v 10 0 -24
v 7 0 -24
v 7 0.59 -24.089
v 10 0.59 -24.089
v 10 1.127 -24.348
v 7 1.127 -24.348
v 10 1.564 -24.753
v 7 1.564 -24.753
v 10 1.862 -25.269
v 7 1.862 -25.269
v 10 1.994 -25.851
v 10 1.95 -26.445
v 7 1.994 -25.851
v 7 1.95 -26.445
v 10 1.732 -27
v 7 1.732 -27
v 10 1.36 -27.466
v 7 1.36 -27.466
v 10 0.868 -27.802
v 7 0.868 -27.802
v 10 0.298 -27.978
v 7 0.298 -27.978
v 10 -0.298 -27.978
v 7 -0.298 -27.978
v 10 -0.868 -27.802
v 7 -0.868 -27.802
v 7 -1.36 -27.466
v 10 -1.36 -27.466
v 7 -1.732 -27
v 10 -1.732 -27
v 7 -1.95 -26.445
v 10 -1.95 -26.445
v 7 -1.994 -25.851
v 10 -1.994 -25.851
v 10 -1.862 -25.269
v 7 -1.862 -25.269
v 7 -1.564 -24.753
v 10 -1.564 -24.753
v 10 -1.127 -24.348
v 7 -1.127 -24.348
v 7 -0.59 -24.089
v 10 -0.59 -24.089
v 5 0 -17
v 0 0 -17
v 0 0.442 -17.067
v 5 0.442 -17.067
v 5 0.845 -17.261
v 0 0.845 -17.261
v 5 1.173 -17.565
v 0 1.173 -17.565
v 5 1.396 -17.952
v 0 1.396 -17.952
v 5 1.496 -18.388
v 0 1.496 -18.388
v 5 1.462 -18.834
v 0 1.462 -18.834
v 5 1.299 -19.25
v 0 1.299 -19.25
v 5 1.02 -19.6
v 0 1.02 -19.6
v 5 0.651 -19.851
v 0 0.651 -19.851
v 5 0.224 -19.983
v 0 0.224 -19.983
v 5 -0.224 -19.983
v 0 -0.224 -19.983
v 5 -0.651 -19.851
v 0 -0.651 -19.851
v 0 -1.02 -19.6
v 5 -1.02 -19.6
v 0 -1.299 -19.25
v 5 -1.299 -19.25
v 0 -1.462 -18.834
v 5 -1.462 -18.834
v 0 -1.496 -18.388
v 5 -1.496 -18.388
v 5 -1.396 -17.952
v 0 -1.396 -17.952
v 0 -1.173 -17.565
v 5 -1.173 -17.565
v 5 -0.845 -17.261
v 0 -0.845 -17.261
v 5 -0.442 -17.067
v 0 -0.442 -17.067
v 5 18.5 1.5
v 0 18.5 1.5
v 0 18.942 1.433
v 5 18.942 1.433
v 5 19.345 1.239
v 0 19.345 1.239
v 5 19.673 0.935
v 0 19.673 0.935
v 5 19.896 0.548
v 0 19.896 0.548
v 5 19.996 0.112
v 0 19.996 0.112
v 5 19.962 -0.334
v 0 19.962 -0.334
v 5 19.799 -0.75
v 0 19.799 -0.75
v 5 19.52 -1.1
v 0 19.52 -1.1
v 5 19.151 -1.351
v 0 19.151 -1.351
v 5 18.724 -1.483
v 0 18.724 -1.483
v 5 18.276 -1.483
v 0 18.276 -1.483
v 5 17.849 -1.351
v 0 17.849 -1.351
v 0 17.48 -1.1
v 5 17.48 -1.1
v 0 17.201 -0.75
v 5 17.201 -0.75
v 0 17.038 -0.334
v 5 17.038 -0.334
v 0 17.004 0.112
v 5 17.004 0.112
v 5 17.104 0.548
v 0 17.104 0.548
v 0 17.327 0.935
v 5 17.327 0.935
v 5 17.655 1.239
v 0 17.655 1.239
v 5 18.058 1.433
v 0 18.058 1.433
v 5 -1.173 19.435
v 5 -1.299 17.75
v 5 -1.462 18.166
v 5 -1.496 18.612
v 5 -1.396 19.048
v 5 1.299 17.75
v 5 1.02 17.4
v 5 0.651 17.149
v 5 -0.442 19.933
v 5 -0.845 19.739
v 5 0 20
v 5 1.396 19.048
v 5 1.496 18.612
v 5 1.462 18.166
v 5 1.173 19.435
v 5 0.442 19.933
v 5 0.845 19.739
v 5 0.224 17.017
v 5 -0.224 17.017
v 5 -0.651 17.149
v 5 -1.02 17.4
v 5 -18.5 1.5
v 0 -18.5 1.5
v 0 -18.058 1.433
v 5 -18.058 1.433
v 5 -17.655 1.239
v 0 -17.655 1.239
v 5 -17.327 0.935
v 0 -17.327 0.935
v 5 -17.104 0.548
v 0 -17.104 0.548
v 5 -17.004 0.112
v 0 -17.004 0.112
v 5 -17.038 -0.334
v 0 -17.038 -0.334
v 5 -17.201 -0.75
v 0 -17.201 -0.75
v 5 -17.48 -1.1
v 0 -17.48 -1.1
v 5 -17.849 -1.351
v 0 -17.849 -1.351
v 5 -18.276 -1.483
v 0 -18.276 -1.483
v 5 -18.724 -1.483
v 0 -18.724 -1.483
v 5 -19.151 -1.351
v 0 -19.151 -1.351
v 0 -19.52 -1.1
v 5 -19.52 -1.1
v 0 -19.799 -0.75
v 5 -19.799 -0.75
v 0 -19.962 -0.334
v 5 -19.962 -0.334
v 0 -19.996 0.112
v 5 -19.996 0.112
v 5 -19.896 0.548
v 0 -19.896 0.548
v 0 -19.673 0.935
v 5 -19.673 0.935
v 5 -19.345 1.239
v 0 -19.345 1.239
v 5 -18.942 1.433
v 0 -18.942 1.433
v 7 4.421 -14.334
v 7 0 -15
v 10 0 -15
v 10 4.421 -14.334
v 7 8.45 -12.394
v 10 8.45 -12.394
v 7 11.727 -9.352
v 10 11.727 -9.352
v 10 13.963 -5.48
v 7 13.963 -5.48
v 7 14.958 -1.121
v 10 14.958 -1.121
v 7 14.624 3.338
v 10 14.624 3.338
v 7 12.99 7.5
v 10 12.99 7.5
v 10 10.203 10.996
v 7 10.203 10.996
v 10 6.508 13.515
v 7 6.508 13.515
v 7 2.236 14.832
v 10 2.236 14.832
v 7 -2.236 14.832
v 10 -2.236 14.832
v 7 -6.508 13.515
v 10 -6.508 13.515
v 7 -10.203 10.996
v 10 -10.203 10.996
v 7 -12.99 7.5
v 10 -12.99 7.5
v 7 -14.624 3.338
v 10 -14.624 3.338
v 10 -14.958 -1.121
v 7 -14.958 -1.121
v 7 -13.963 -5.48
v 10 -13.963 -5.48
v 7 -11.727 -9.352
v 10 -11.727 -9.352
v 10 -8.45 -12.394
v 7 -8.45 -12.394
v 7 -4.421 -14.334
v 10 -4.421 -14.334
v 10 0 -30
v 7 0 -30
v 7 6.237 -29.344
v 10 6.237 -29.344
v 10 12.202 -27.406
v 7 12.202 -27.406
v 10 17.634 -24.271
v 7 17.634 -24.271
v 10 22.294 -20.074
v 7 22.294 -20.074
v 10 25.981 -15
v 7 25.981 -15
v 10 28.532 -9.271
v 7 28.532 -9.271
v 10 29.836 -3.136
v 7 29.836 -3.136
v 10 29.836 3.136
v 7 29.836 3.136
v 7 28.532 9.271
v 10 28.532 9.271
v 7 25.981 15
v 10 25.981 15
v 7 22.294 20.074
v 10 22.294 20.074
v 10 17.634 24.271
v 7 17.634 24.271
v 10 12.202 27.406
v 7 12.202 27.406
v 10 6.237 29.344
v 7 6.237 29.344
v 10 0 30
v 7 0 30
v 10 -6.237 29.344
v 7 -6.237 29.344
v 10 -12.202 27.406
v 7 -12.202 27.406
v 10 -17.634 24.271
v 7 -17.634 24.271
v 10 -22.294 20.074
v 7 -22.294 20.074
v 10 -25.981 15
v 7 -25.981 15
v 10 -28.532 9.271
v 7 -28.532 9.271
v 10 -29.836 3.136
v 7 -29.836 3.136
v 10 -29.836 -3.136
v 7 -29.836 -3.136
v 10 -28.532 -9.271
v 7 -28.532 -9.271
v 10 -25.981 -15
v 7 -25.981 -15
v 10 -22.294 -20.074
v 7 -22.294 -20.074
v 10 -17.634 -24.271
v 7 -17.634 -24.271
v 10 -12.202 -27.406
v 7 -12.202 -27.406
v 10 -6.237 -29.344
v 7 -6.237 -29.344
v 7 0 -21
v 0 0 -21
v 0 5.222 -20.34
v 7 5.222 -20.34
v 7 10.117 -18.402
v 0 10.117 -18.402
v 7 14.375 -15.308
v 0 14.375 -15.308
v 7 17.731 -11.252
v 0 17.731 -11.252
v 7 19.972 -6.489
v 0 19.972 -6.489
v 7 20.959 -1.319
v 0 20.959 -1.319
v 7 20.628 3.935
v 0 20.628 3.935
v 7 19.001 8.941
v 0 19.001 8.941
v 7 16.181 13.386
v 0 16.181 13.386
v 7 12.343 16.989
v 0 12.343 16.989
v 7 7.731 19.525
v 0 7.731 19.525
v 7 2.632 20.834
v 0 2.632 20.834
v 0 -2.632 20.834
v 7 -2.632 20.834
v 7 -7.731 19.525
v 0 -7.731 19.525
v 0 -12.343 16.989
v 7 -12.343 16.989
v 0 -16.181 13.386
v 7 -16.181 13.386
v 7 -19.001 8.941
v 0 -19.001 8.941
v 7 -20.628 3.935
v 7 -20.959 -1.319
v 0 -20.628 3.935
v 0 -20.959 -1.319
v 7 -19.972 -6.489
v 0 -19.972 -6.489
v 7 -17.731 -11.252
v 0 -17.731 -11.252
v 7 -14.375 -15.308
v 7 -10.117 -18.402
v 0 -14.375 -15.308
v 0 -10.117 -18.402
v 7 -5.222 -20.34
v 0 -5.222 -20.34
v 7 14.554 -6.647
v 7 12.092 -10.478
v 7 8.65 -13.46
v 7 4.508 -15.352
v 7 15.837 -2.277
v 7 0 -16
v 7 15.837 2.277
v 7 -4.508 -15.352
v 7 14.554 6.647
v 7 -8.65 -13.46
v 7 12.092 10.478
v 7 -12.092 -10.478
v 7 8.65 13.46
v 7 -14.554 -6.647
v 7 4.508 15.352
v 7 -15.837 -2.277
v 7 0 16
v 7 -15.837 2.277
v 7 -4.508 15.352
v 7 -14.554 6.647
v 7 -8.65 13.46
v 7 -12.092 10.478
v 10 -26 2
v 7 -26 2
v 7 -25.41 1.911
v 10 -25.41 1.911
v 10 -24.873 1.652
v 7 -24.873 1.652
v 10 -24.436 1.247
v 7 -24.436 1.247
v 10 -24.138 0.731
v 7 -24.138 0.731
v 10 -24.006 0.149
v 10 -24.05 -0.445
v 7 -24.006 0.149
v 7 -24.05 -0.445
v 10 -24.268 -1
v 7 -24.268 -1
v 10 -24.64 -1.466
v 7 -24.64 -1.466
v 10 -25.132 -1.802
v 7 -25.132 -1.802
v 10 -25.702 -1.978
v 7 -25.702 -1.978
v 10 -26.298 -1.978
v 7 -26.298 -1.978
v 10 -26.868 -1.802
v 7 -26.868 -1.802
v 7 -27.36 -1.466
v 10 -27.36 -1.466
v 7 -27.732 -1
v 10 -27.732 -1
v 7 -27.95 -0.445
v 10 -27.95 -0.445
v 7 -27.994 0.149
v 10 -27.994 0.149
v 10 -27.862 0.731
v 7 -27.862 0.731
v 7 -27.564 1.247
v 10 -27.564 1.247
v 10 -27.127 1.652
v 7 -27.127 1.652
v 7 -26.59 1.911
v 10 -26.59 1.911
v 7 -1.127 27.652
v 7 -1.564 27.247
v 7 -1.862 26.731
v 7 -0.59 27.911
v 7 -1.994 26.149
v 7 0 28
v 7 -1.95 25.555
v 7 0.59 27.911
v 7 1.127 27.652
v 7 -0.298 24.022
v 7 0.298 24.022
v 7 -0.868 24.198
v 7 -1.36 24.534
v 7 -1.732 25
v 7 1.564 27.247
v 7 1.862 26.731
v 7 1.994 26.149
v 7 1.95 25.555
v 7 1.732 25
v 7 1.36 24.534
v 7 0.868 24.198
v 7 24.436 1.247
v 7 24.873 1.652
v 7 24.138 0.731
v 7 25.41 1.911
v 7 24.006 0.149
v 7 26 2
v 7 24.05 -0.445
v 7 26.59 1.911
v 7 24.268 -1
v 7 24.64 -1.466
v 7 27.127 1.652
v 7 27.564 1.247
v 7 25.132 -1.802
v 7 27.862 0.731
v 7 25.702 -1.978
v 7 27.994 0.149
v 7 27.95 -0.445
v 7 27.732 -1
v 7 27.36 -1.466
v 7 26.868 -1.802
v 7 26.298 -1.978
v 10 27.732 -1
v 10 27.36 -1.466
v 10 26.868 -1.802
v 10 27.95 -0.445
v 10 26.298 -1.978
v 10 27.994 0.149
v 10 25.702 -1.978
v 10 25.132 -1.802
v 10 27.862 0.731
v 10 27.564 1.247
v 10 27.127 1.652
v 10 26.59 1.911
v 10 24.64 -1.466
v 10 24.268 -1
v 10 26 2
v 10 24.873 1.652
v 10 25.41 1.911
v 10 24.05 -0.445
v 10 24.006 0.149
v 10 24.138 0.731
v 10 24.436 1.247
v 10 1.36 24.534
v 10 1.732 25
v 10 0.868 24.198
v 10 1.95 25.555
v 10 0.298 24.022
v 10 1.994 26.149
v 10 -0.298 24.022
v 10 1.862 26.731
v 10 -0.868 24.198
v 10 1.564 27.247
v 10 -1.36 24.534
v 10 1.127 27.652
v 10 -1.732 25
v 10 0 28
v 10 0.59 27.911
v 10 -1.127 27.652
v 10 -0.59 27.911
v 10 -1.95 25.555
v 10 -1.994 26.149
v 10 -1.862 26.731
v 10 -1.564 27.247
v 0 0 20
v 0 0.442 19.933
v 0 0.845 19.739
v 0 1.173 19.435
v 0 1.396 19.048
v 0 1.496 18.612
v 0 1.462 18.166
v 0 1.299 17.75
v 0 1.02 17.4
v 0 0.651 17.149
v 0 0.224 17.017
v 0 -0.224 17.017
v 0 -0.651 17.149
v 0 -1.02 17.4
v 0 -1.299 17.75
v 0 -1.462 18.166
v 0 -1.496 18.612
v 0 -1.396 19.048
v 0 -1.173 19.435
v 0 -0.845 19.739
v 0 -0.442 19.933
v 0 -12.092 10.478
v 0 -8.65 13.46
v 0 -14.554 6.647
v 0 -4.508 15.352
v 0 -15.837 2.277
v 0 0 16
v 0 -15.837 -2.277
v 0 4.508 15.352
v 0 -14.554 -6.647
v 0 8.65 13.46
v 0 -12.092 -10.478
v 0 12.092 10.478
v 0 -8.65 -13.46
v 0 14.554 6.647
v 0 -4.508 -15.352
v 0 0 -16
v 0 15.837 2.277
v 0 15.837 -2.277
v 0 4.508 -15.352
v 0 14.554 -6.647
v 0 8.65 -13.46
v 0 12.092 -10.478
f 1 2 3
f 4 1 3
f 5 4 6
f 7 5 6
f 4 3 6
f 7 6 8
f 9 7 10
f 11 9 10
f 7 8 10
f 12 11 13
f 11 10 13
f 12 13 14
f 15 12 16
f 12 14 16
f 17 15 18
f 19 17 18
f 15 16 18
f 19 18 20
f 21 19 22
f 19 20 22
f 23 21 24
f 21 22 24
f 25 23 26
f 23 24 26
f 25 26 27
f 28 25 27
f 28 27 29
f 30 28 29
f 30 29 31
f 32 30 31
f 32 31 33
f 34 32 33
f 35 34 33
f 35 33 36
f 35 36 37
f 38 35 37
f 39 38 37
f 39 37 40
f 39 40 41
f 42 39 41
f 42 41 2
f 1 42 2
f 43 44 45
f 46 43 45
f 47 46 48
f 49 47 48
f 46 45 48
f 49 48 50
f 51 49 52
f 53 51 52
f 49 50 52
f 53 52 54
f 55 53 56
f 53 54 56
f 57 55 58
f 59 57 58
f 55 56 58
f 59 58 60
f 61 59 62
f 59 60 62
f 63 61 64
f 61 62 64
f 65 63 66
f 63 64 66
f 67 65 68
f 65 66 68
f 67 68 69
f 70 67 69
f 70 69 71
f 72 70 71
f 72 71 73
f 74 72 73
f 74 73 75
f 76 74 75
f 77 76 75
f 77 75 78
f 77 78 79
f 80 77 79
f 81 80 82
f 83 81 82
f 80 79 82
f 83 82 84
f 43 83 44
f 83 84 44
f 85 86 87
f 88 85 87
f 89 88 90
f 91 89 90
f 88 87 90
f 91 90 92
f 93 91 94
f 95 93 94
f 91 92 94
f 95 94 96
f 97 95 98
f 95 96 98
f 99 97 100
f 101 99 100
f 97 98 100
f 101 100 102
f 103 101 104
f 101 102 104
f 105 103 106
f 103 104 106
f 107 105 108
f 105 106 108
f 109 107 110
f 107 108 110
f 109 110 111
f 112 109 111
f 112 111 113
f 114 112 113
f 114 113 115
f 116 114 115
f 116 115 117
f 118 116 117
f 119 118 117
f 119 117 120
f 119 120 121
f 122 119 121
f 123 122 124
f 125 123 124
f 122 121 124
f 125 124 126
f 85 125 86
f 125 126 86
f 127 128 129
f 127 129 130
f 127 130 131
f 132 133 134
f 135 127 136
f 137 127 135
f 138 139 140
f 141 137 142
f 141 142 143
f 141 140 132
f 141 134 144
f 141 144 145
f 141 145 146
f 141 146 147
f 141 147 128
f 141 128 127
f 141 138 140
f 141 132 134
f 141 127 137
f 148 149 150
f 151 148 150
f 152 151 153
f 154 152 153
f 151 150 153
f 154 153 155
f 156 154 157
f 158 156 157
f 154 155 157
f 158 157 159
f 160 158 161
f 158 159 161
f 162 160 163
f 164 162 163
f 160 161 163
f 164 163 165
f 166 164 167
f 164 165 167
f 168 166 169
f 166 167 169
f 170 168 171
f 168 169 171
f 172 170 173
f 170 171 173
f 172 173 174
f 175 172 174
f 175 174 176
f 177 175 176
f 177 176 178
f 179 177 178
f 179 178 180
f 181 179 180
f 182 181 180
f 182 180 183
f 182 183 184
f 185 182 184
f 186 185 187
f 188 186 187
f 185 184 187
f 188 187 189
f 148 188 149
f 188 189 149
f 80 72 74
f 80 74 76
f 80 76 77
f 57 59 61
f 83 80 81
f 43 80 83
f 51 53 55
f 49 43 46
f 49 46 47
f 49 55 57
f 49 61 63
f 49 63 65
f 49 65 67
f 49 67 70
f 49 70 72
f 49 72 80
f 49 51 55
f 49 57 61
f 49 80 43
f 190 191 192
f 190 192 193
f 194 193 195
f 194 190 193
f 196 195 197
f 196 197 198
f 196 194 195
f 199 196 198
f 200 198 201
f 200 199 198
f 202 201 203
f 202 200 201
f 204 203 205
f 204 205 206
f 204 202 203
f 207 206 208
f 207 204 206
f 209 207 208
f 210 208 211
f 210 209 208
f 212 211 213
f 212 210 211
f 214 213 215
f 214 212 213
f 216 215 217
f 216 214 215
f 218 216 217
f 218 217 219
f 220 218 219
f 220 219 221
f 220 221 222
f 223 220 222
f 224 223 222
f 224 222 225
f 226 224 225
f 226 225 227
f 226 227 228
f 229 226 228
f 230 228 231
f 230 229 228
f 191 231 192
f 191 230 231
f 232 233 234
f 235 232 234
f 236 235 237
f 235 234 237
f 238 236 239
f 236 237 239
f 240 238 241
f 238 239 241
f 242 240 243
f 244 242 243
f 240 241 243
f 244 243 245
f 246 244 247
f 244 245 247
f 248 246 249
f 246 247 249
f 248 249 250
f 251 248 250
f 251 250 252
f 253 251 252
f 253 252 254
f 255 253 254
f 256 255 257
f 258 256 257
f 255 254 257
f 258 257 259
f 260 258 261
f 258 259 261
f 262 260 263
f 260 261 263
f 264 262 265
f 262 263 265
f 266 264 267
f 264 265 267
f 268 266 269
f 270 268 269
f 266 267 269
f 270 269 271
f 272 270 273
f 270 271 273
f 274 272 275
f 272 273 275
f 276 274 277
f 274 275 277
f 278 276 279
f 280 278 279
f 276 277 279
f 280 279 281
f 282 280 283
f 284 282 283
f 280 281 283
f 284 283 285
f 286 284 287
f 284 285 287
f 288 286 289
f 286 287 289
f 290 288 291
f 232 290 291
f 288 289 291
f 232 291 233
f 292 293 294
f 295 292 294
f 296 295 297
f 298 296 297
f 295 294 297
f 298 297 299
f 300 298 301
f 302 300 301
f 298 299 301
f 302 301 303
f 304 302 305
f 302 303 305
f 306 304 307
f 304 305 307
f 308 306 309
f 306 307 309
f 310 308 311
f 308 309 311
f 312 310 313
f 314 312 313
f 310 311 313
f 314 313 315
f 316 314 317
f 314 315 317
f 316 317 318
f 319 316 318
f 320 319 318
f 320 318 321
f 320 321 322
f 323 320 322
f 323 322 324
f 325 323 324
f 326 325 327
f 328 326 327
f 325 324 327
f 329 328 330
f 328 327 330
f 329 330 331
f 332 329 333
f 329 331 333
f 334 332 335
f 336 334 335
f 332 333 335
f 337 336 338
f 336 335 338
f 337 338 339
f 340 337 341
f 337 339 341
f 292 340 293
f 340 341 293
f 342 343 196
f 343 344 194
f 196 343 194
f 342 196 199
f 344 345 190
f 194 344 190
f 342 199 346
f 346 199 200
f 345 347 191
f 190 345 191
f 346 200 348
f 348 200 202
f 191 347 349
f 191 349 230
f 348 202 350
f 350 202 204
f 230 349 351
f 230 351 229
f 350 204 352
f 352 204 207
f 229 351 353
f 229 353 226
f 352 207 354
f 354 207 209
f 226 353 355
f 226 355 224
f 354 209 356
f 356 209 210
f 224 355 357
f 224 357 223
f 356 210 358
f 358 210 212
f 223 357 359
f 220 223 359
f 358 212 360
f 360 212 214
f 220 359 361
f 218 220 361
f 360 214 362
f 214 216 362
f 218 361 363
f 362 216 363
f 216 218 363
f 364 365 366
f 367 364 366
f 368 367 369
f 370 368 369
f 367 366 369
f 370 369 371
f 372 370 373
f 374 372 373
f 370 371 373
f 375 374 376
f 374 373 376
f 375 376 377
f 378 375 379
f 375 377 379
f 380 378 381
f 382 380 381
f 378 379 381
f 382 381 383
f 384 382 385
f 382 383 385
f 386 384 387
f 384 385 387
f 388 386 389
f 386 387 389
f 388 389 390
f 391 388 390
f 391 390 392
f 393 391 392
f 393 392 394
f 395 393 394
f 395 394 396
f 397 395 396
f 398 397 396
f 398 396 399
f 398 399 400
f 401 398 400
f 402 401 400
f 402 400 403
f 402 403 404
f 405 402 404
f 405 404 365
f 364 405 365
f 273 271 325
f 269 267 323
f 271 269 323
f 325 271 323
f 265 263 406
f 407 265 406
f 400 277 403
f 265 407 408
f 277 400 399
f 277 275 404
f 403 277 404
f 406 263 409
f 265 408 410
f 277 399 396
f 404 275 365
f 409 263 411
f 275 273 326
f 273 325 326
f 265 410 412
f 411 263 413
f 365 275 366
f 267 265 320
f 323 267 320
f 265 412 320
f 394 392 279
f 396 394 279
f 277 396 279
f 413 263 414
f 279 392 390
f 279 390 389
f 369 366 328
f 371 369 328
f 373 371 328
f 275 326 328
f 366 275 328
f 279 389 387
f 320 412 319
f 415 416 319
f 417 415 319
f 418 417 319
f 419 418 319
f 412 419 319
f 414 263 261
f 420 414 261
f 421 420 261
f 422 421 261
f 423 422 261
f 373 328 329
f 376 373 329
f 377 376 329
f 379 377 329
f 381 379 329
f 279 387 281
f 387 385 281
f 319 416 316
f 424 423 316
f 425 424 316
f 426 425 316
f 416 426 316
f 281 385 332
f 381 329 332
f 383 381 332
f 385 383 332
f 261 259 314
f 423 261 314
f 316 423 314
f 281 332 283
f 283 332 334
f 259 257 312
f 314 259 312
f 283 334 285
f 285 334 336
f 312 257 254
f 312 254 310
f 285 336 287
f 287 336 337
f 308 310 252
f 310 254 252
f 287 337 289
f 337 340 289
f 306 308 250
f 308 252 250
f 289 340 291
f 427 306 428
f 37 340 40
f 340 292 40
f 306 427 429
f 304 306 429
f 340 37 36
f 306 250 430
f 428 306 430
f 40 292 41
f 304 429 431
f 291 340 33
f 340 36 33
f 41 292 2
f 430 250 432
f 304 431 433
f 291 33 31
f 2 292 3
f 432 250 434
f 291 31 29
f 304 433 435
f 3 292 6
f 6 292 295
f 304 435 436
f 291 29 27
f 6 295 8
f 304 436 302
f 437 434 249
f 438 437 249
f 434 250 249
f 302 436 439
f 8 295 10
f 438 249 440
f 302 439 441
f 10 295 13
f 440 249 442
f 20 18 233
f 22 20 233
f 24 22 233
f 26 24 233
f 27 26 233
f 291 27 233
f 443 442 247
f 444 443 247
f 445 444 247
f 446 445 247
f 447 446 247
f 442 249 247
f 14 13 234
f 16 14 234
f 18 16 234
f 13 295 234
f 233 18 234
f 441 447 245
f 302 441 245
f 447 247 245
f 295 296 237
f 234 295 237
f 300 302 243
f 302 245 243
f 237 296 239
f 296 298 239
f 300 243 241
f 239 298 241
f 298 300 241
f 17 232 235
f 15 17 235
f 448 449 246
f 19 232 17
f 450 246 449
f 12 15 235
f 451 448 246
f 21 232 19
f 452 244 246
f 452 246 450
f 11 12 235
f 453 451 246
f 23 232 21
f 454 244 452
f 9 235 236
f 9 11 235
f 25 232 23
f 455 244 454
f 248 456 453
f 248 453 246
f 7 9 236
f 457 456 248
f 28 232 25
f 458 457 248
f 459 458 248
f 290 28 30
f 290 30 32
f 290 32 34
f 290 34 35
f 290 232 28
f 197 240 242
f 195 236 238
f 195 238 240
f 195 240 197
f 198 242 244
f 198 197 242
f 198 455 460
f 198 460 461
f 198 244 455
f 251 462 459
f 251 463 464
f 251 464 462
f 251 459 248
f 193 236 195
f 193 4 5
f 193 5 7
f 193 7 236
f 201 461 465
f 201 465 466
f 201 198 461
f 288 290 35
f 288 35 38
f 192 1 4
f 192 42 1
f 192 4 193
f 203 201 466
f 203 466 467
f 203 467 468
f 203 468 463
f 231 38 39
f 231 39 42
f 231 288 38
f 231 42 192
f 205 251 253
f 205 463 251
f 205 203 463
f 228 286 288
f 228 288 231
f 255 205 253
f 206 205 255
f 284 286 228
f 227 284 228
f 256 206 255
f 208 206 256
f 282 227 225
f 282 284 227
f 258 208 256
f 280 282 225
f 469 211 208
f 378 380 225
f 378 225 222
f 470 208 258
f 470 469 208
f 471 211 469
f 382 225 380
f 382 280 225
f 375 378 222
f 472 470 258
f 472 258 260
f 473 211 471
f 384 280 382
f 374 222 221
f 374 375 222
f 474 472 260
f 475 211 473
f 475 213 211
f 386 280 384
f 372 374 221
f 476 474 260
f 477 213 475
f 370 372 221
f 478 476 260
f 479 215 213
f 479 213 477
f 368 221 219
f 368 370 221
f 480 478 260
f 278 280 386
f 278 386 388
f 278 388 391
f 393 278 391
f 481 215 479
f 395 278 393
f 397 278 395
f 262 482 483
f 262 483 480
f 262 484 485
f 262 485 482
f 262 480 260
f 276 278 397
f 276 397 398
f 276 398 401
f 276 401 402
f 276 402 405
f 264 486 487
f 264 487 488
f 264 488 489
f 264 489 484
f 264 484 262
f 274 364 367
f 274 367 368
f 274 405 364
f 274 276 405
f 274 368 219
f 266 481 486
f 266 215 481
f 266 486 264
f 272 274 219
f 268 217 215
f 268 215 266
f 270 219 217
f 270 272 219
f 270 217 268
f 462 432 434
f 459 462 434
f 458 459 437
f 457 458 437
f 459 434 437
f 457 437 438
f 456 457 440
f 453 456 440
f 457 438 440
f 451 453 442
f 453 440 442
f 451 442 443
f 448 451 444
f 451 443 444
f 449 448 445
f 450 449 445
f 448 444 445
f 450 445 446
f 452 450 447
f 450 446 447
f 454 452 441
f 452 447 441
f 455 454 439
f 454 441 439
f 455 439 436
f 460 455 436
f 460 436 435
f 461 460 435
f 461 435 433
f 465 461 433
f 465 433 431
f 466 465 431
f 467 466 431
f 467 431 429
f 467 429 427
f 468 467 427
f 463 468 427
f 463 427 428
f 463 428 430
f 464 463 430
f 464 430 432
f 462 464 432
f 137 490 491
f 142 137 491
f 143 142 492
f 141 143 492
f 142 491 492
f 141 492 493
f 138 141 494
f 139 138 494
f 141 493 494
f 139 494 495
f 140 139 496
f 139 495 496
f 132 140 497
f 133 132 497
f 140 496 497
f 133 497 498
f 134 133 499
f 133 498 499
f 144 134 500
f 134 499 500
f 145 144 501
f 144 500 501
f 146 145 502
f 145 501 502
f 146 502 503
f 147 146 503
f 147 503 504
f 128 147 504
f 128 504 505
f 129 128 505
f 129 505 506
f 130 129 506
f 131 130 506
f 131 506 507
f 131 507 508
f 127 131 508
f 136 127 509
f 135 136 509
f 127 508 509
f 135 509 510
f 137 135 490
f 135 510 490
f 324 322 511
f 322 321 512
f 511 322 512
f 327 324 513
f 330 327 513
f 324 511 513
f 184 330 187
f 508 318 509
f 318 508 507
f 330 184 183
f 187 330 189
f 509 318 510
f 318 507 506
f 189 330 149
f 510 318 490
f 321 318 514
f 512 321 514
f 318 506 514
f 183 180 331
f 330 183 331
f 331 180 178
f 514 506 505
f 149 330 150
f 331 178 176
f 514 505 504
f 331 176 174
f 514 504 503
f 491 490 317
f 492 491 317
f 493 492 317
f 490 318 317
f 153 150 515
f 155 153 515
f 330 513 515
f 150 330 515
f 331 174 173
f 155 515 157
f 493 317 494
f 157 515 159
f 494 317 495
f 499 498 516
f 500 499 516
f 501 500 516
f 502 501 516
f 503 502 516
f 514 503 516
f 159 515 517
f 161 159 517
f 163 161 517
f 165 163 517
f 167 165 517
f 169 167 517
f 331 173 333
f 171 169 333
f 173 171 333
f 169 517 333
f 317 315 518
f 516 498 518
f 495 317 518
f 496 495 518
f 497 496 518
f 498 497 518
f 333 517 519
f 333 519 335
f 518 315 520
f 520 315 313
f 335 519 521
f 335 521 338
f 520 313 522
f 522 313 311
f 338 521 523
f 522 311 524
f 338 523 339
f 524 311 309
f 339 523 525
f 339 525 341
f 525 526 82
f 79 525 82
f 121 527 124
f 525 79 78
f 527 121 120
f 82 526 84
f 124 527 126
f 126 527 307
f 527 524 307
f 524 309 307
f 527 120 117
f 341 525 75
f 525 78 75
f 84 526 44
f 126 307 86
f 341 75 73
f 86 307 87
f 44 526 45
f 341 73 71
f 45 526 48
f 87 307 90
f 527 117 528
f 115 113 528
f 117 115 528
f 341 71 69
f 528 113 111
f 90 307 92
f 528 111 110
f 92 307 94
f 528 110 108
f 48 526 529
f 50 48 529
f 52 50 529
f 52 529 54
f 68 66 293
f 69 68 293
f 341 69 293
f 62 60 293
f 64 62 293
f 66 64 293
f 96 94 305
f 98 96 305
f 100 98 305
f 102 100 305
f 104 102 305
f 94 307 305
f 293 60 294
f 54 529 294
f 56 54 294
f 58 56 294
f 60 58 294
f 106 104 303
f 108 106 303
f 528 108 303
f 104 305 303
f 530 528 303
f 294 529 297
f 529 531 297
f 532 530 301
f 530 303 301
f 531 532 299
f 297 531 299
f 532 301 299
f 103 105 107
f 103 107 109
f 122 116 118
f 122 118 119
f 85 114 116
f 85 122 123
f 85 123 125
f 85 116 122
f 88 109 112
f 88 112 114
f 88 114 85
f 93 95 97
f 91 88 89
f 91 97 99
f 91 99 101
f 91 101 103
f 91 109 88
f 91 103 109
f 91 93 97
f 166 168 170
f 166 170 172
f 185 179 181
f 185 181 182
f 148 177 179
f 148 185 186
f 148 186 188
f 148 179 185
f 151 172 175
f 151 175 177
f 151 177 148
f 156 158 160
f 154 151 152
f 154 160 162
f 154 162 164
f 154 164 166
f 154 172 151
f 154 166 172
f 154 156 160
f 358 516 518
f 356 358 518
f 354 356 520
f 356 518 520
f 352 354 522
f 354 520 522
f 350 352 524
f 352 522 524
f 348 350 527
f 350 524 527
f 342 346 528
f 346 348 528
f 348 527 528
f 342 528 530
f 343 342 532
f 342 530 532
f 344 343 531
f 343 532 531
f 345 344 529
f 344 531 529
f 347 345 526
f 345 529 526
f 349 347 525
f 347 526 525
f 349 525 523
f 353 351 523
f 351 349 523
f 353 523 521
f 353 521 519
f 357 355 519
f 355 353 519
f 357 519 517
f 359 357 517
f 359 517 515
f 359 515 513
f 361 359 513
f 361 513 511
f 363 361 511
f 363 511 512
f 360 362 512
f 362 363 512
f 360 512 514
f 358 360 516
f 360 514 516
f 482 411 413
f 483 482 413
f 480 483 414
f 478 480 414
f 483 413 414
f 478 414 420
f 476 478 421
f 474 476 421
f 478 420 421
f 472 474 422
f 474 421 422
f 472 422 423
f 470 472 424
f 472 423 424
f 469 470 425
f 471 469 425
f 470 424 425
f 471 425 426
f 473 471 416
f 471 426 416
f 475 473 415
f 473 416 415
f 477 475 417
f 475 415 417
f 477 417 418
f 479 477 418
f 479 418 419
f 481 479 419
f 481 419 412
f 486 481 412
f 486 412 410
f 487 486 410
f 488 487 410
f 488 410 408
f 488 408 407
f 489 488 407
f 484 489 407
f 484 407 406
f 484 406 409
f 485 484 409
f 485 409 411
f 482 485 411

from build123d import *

# Parameters (mm, degrees)
SKETCH1_R           = 21
BOSS_EXTRUDE1_DEPTH = 7
SKETCH2_R           = 30
BOSS_EXTRUDE2_DEPTH = 3
SKETCH3_R           = 16
CUT_EXTRUDE1_DEPTH  = 44.588989435
SKETCH4_R           = 1.5
CUT_EXTRUDE2_DEPTH  = 5
BOSS_EXTRUDE3_START = -3
SKETCH5_R           = 16
SKETCH5_R_2         = 15
BOSS_EXTRUDE3_DEPTH = 3
SKETCH6_R           = 2
CUT_EXTRUDE3_DEPTH  = 44


with BuildPart() as part:
    # Sketch1 → Boss-Extrude1 (new body)
    with BuildSketch(Plane(origin=(0, 0, 0), x_dir=(0, 0, -1), z_dir=(1, 0, 0))):
        Circle(SKETCH1_R)
    extrude(amount=BOSS_EXTRUDE1_DEPTH)

    # Sketch2 → Boss-Extrude2 (add)
    with BuildSketch(Plane(origin=(7, 0, 0), x_dir=(0, 0, -1), z_dir=(1, 0, 0))):
        Circle(SKETCH2_R)
    extrude(amount=BOSS_EXTRUDE2_DEPTH)

    # Sketch3 → Cut-Extrude1 (cut, through all)
    with BuildSketch(Plane.ZY):
        Circle(SKETCH3_R)
    extrude(amount=-CUT_EXTRUDE1_DEPTH, mode=Mode.SUBTRACT)

    # Sketch4 → Cut-Extrude2 (cut)
    with BuildSketch(Plane.ZY):
        with Locations((0, 18.5)):
            Circle(SKETCH4_R)
        with Locations((18.5, 0)):
            Circle(SKETCH4_R)
        with Locations((0, -18.5)):
            Circle(SKETCH4_R)
        with Locations((-18.5, 0)):
            Circle(SKETCH4_R)
    extrude(amount=-CUT_EXTRUDE2_DEPTH, mode=Mode.SUBTRACT)

    # Sketch5 → Boss-Extrude3 (add)
    with BuildSketch(Plane(origin=(10, 0, 0), x_dir=(0, 0, -1), z_dir=(1, 0, 0)).offset(BOSS_EXTRUDE3_START)):
        with Locations(Location((0, 0, 0), (0, 0, 180))):
            Circle(SKETCH5_R)
        Circle(SKETCH5_R_2, mode=Mode.SUBTRACT)
    extrude(amount=BOSS_EXTRUDE3_DEPTH)

    # Sketch6 → Cut-Extrude3 (cut, through all)
    with BuildSketch(Plane.ZY.offset(-7)):
        with Locations((0, 26)):
            Circle(SKETCH6_R)
        with Locations((26, 0)):
            Circle(SKETCH6_R)
        with Locations((0, -26)):
            Circle(SKETCH6_R)
        with Locations((-26, 0)):
            Circle(SKETCH6_R)
    extrude(amount=-CUT_EXTRUDE3_DEPTH, mode=Mode.SUBTRACT)


solid = part.part
